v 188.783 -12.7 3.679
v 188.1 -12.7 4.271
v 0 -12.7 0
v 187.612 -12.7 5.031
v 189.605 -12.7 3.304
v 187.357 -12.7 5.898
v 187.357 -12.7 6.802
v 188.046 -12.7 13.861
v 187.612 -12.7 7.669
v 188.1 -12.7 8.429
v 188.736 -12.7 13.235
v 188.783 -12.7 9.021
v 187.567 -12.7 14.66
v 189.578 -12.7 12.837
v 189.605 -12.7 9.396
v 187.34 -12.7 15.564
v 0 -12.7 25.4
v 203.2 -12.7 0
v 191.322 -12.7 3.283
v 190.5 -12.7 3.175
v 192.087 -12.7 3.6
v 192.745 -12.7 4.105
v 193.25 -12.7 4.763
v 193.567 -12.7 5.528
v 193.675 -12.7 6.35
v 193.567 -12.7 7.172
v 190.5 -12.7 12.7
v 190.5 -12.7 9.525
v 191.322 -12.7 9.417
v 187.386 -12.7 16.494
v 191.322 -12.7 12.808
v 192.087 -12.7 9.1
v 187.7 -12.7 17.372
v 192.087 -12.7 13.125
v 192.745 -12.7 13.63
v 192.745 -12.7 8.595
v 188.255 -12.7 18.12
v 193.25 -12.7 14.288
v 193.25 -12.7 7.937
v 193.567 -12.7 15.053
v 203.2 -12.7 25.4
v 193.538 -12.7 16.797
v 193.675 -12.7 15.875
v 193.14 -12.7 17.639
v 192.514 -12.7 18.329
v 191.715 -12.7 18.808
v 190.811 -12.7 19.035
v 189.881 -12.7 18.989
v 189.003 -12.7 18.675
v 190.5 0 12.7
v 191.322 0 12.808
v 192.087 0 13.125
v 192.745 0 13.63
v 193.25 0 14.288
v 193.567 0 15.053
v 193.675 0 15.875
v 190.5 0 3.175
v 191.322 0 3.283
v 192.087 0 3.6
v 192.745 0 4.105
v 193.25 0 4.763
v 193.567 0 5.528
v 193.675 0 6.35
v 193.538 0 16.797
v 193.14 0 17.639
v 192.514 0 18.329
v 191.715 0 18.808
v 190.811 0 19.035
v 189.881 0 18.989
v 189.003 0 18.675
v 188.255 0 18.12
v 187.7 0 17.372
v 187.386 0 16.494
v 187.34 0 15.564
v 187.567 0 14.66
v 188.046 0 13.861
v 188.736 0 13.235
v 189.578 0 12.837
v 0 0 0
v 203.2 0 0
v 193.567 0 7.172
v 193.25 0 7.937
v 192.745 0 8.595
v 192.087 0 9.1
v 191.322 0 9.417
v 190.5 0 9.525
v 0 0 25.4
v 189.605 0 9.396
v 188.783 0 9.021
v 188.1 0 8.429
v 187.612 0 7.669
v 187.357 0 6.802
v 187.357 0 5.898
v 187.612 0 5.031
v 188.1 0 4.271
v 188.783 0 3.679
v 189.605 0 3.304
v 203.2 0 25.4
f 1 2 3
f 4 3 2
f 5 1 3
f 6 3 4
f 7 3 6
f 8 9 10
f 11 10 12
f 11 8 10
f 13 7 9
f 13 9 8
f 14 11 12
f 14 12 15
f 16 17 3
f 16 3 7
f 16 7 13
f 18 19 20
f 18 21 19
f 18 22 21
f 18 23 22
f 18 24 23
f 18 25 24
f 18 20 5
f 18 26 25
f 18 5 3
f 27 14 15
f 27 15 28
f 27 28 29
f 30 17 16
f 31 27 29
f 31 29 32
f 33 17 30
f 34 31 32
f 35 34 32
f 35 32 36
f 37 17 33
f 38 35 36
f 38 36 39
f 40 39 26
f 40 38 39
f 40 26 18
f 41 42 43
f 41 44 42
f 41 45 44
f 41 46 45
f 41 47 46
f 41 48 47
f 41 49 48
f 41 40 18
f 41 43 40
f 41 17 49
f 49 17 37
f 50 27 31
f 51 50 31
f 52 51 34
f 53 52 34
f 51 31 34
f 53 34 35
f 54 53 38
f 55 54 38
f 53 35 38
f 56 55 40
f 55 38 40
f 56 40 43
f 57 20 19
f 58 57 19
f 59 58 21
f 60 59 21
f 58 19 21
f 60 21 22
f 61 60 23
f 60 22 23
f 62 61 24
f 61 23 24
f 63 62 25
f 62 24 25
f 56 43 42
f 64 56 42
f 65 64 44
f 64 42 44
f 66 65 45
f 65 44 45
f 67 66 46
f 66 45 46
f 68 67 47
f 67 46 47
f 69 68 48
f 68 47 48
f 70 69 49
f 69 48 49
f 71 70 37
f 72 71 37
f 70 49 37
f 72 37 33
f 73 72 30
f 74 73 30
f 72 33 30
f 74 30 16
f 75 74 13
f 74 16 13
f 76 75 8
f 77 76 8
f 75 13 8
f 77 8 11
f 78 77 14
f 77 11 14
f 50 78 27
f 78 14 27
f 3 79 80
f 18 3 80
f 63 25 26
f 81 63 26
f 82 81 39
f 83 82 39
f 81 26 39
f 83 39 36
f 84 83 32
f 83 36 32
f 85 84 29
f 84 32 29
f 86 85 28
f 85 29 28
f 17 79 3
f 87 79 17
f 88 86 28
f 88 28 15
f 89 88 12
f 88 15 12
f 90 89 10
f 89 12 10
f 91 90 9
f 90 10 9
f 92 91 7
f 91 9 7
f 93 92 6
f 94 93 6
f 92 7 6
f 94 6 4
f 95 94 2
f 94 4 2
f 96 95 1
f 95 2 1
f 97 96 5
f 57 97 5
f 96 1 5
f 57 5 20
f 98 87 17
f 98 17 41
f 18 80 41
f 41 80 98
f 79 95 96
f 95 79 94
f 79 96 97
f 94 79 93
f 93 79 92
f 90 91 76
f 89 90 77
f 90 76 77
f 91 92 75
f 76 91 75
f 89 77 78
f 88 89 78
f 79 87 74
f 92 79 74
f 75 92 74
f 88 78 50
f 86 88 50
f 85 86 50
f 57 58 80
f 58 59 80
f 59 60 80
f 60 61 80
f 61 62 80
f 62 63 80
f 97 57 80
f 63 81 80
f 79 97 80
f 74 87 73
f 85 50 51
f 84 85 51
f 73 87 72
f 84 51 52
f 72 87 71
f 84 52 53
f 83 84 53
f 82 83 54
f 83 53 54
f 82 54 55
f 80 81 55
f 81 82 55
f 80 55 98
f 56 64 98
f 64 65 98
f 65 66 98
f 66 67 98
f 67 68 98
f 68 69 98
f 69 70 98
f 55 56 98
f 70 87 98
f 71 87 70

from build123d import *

# Parameters (mm, degrees)
F0_W     = 203.2
F0_H     = 25.4
F1_DEPTH = 12.7
F3_DEPTH = 25.4


with BuildPart() as f1:
    # F0 (on Front) → F1 (new body)
    with BuildSketch(Plane.XZ):
        with Locations((101.6, 12.7)):
            Rectangle(F0_W, F0_H)
    extrude(amount=F1_DEPTH)

    # F2 (on face) → F3 (cut)
    with BuildSketch(Plane.XZ.offset(12.7)):
        with BuildLine():
            ThreePointArc((193.675, 15.875), (188.254936, 18.120064), (190.5, 12.7))
            ThreePointArc((190.5, 12.7), (192.745064, 13.629936), (193.675, 15.875))
        make_face()
        with BuildLine():
            Line((190.5, 6.35), (190.5, 3.175))
            ThreePointArc((190.5, 3.175), (192.745064, 4.104936), (193.675, 6.35))
            ThreePointArc((193.675, 6.35), (192.745064, 8.595064), (190.5, 9.525))
            Line((190.5, 9.525), (190.5, 6.35))
        make_face()
        with BuildLine():
            ThreePointArc((190.5, 9.525), (187.325, 6.35), (190.5, 3.175))
            Line((190.5, 3.175), (190.5, 6.35))
            Line((190.5, 6.35), (190.5, 9.525))
        make_face()
    extrude(amount=-F3_DEPTH, mode=Mode.SUBTRACT)


solid = f1.part
